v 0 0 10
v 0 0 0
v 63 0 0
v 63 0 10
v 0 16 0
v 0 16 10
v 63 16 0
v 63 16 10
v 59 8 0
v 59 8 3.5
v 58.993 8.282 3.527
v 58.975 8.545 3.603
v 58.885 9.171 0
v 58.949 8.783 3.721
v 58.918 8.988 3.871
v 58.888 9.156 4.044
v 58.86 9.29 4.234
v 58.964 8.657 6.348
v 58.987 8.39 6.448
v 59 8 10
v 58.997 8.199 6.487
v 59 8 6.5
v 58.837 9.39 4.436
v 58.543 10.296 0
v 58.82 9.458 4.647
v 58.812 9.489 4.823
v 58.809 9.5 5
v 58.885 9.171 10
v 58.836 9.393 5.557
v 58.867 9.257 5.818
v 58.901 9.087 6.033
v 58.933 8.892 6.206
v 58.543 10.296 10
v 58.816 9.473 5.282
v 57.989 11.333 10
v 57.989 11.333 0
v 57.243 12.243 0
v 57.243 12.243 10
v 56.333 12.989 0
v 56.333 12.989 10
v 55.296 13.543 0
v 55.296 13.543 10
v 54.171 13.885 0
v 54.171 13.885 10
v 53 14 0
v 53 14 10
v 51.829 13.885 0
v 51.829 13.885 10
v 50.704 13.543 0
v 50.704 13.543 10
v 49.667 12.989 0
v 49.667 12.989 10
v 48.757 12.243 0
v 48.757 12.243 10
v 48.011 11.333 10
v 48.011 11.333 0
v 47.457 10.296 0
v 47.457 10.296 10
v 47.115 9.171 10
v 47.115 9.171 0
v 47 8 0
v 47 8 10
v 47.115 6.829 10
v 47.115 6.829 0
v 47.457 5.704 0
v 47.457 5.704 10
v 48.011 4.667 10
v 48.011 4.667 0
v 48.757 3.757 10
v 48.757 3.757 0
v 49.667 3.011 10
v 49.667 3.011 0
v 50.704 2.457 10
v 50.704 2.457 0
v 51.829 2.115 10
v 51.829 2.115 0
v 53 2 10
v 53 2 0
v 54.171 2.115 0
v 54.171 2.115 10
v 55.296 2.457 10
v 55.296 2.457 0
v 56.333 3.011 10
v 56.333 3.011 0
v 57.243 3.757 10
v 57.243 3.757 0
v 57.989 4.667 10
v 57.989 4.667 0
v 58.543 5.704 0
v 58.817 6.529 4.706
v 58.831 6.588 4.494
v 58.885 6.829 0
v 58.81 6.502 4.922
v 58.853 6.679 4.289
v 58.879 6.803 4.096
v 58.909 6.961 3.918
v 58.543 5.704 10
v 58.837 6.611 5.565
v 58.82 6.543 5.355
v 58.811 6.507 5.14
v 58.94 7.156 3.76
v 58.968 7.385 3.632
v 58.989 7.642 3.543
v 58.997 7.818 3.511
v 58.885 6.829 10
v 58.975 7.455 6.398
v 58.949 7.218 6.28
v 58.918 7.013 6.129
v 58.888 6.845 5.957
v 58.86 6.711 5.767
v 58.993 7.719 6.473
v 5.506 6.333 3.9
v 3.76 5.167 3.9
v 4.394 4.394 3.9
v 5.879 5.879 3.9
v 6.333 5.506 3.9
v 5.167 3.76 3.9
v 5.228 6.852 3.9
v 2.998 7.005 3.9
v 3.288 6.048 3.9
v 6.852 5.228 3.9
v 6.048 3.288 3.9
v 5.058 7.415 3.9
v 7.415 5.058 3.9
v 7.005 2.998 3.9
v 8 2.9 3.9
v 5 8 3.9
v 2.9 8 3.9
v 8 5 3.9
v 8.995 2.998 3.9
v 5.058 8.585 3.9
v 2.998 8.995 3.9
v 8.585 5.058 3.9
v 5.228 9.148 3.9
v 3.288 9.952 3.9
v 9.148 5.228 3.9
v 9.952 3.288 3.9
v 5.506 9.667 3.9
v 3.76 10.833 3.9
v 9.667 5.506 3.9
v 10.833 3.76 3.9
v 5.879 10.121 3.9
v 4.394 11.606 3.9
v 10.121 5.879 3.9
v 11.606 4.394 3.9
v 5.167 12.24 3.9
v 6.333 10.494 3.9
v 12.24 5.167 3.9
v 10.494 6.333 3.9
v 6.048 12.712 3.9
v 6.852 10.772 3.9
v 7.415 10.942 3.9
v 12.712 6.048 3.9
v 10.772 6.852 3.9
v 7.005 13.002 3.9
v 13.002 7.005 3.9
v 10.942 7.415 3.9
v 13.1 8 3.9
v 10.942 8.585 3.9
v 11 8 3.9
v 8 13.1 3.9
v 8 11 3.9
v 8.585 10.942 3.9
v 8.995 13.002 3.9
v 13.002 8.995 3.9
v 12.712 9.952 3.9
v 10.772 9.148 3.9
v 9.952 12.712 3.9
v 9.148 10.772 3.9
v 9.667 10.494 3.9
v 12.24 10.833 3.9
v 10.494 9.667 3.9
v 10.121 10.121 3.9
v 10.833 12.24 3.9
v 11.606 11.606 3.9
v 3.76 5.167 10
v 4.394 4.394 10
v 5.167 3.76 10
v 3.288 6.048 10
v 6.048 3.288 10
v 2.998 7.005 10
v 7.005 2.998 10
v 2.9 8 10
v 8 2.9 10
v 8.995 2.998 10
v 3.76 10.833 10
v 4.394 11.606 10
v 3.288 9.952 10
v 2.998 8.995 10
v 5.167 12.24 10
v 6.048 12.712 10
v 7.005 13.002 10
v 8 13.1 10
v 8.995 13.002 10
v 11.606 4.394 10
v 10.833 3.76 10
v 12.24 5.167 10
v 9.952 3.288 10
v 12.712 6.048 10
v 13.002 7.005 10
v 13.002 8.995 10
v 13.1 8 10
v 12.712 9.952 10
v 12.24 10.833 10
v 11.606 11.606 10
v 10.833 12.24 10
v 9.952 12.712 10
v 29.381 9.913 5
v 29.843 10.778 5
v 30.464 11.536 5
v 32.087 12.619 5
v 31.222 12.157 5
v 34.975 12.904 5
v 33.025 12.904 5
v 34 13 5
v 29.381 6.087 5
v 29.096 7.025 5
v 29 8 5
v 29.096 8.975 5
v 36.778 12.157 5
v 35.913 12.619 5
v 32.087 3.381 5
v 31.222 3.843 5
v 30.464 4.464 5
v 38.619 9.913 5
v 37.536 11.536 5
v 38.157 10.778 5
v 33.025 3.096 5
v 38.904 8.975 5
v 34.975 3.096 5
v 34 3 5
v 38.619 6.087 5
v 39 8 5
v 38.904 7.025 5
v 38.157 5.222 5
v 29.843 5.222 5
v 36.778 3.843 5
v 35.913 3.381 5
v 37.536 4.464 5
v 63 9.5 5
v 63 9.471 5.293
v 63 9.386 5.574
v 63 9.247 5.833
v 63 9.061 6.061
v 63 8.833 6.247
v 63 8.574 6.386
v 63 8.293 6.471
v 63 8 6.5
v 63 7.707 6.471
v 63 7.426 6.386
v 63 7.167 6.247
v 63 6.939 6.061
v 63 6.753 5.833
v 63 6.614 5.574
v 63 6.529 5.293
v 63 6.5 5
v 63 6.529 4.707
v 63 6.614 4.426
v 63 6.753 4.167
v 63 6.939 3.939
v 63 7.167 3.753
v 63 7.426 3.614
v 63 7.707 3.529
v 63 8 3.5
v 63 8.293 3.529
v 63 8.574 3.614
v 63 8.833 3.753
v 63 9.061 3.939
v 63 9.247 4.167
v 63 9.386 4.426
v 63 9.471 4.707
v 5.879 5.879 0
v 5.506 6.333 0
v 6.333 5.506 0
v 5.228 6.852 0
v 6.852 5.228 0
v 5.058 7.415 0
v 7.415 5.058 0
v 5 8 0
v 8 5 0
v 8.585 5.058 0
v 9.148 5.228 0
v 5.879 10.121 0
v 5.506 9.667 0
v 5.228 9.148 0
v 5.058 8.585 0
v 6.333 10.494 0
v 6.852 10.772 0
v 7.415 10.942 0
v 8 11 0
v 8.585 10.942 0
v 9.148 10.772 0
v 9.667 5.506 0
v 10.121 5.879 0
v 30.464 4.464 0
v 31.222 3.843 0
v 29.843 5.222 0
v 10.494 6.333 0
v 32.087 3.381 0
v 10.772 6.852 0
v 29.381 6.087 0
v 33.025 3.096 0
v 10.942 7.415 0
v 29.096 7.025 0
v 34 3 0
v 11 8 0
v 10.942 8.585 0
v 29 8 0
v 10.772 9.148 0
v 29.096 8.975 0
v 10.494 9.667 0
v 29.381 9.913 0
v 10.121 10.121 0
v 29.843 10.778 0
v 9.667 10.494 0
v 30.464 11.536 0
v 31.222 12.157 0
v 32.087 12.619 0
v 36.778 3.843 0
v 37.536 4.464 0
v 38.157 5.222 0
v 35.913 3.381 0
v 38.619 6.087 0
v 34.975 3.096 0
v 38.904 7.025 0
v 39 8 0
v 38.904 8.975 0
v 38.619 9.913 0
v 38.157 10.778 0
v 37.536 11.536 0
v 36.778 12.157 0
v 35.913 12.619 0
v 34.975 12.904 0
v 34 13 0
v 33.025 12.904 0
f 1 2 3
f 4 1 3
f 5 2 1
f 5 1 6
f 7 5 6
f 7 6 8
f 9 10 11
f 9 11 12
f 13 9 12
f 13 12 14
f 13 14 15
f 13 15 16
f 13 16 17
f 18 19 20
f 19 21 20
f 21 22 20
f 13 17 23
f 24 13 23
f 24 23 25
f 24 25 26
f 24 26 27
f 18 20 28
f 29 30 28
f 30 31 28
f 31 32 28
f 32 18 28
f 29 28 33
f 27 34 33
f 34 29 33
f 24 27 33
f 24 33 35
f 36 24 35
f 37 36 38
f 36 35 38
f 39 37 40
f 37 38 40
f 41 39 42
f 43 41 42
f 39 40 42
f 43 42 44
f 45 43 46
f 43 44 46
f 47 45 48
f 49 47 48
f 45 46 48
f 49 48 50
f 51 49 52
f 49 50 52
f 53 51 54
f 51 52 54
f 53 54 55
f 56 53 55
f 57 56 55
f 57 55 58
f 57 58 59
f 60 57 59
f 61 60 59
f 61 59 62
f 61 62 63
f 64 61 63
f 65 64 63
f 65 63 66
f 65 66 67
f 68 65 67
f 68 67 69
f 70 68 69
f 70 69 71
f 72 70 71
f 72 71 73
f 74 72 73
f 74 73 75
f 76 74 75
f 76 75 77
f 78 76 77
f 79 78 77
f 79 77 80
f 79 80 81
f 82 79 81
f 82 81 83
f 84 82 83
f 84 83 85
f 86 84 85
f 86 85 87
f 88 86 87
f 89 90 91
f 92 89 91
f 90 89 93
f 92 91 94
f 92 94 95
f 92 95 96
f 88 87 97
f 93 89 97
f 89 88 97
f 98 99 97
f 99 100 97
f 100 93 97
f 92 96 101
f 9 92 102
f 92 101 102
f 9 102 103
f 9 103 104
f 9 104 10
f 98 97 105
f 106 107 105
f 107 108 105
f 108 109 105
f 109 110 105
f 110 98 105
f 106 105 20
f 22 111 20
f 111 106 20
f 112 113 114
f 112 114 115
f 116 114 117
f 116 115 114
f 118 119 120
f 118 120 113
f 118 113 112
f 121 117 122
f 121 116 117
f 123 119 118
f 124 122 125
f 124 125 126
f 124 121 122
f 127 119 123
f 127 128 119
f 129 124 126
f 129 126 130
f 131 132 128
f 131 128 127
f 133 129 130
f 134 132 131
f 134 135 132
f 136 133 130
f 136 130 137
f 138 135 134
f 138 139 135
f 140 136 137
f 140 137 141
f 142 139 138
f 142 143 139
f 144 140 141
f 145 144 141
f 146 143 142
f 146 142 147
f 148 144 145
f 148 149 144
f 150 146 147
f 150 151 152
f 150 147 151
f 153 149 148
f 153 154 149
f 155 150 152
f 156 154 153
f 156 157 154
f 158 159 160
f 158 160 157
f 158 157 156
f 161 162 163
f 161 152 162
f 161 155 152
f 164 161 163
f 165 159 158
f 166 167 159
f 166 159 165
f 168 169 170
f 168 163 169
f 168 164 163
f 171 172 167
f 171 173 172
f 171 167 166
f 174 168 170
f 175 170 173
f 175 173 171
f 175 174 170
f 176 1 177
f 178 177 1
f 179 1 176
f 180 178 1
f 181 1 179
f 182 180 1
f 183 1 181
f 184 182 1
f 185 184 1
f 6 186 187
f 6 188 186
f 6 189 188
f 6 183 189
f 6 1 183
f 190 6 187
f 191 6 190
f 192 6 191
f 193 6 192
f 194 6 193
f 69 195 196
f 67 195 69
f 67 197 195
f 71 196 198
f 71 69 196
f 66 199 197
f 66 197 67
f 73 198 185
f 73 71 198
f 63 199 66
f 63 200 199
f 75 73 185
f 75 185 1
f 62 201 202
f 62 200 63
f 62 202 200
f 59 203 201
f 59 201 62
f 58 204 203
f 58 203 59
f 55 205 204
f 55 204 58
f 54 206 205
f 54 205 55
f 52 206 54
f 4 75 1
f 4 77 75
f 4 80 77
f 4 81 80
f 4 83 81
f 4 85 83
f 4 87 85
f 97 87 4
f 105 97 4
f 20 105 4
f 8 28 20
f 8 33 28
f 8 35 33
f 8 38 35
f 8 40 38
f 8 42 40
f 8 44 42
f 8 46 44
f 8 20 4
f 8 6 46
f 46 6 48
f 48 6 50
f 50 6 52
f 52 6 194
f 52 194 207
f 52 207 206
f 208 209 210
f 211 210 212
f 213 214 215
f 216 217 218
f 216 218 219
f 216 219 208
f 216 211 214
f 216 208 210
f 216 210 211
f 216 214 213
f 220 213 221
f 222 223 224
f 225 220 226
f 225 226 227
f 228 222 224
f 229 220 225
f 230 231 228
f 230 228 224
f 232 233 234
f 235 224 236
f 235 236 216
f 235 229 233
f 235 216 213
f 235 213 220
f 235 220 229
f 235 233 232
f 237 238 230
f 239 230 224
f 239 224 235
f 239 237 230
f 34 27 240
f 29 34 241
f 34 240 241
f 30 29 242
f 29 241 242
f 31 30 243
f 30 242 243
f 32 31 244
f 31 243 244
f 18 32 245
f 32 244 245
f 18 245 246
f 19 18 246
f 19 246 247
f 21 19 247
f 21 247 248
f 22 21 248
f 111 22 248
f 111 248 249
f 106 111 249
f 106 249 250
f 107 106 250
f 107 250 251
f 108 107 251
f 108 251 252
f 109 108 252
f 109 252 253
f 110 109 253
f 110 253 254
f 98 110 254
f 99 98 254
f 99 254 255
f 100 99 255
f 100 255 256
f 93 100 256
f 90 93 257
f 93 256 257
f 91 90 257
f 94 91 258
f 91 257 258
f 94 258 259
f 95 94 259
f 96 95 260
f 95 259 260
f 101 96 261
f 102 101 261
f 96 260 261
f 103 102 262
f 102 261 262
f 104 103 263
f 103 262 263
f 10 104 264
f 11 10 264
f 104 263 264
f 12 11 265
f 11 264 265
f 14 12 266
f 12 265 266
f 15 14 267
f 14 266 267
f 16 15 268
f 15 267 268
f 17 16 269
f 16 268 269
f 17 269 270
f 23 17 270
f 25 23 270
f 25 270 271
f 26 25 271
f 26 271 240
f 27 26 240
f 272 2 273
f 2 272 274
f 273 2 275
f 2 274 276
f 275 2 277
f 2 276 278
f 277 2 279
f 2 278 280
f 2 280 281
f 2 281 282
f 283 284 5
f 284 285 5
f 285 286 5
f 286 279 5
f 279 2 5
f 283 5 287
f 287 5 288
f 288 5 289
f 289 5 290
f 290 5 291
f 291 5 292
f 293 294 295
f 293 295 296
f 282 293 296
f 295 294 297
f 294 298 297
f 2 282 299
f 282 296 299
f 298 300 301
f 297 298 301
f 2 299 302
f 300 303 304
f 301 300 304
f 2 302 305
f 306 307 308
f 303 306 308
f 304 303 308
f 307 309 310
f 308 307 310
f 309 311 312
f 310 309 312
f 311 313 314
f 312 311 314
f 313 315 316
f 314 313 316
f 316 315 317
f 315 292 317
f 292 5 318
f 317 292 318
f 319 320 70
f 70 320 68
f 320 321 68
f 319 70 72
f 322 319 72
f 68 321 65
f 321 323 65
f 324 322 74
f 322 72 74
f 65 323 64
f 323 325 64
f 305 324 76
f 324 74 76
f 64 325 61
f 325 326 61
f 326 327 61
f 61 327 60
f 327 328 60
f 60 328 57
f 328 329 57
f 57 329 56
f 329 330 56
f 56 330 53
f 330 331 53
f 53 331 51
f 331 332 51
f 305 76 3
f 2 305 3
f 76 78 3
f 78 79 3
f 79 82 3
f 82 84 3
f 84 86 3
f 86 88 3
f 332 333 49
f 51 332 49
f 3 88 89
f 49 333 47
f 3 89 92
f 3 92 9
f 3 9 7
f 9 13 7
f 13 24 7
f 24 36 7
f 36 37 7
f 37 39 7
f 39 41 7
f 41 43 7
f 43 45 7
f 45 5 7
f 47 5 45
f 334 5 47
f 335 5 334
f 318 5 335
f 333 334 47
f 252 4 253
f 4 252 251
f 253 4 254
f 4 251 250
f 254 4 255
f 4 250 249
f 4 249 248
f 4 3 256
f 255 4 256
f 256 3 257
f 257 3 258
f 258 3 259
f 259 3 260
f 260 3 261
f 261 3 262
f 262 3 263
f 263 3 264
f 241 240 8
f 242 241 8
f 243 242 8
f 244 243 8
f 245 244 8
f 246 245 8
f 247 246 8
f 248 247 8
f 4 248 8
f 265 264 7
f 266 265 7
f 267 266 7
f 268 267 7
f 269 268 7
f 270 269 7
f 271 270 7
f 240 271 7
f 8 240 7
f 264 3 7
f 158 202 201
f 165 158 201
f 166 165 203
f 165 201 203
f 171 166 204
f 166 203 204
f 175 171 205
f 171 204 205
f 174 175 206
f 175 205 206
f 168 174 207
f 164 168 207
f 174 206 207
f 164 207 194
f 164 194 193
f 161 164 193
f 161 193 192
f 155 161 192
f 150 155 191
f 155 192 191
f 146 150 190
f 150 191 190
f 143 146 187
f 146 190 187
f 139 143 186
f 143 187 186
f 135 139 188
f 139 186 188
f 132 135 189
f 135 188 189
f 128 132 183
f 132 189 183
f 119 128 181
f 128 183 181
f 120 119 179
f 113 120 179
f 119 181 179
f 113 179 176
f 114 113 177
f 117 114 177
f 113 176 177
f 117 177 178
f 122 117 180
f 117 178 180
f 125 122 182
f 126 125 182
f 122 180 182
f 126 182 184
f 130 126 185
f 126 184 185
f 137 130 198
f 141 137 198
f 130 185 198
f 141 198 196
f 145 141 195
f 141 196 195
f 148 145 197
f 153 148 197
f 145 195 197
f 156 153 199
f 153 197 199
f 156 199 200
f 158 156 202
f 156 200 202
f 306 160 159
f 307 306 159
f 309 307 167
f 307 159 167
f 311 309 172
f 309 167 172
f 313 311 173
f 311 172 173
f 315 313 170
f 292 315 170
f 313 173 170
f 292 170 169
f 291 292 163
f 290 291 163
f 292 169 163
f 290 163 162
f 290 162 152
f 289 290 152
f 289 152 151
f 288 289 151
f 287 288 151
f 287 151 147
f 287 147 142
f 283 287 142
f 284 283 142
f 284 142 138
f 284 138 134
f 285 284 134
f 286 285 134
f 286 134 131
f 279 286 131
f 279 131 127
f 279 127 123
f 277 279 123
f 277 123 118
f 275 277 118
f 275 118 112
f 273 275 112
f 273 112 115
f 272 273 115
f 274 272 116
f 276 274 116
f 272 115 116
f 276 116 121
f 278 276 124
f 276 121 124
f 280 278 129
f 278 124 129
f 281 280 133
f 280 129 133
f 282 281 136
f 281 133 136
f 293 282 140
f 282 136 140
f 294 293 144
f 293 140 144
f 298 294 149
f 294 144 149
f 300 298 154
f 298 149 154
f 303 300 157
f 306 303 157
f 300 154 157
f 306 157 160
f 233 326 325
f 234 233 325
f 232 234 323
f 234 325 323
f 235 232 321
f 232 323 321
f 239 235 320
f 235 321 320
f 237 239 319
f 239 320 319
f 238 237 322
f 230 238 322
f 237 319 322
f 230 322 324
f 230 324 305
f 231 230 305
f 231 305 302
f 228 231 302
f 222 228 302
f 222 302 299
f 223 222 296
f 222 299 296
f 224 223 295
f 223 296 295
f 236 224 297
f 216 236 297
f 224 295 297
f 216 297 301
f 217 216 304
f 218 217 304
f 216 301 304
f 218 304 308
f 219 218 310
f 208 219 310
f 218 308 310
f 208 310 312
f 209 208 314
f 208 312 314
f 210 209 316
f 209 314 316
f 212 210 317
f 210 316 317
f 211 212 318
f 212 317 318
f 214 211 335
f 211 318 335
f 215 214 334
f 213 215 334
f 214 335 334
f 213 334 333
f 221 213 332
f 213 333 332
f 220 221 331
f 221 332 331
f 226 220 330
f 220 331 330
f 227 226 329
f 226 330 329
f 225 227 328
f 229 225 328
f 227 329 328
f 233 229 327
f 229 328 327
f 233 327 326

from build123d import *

# Parameters (mm, degrees)
F0_W     = 63
F0_H     = 16
F1_DEPTH = 10
F2_R     = 3
F2_R_2   = 6
F3_DEPTH = 10.001
F2_R_3   = 5.1
F4_DEPTH = 6.1
F5_R     = 1.5
F6_DEPTH = 4.1915250807
F7_R     = 5
F8_DEPTH = 5


with BuildPart() as f1:
    # F0 (on Top) → F1 (new body)
    with BuildSketch(Plane.XY):
        with Locations((31.5, 8)):
            Rectangle(F0_W, F0_H)
    extrude(amount=F1_DEPTH)

    # F2 (on face) → F3 (cut, through all)
    with BuildSketch(Plane.XY.offset(10)):
        with Locations((8, 8)):
            Circle(F2_R)
        with Locations((53, 8)):
            Circle(F2_R_2)
    extrude(amount=-F3_DEPTH, mode=Mode.SUBTRACT)

    # F2 (on face) → F4 (cut)
    with BuildSketch(Plane.XY.offset(10)):
        with Locations((8, 8)):
            Circle(F2_R_3)
        with Locations((8, 8)):
            Circle(F2_R, mode=Mode.SUBTRACT)
    extrude(amount=-F4_DEPTH, mode=Mode.SUBTRACT)

    # F5 (on face) → F6 (cut, through all)
    with BuildSketch(Plane.YZ.offset(63)):
        with Locations((8, 5)):
            Circle(F5_R)
    extrude(amount=-F6_DEPTH, mode=Mode.SUBTRACT)

    # F7 (on face) → F8 (cut)
    with BuildSketch(Plane(origin=(0, 0, 0), x_dir=(1, 0, 0), z_dir=(0, 0, -1))):
        with Locations((34, -8)):
            Circle(F7_R)
    extrude(amount=-F8_DEPTH, mode=Mode.SUBTRACT)


solid = f1.part
